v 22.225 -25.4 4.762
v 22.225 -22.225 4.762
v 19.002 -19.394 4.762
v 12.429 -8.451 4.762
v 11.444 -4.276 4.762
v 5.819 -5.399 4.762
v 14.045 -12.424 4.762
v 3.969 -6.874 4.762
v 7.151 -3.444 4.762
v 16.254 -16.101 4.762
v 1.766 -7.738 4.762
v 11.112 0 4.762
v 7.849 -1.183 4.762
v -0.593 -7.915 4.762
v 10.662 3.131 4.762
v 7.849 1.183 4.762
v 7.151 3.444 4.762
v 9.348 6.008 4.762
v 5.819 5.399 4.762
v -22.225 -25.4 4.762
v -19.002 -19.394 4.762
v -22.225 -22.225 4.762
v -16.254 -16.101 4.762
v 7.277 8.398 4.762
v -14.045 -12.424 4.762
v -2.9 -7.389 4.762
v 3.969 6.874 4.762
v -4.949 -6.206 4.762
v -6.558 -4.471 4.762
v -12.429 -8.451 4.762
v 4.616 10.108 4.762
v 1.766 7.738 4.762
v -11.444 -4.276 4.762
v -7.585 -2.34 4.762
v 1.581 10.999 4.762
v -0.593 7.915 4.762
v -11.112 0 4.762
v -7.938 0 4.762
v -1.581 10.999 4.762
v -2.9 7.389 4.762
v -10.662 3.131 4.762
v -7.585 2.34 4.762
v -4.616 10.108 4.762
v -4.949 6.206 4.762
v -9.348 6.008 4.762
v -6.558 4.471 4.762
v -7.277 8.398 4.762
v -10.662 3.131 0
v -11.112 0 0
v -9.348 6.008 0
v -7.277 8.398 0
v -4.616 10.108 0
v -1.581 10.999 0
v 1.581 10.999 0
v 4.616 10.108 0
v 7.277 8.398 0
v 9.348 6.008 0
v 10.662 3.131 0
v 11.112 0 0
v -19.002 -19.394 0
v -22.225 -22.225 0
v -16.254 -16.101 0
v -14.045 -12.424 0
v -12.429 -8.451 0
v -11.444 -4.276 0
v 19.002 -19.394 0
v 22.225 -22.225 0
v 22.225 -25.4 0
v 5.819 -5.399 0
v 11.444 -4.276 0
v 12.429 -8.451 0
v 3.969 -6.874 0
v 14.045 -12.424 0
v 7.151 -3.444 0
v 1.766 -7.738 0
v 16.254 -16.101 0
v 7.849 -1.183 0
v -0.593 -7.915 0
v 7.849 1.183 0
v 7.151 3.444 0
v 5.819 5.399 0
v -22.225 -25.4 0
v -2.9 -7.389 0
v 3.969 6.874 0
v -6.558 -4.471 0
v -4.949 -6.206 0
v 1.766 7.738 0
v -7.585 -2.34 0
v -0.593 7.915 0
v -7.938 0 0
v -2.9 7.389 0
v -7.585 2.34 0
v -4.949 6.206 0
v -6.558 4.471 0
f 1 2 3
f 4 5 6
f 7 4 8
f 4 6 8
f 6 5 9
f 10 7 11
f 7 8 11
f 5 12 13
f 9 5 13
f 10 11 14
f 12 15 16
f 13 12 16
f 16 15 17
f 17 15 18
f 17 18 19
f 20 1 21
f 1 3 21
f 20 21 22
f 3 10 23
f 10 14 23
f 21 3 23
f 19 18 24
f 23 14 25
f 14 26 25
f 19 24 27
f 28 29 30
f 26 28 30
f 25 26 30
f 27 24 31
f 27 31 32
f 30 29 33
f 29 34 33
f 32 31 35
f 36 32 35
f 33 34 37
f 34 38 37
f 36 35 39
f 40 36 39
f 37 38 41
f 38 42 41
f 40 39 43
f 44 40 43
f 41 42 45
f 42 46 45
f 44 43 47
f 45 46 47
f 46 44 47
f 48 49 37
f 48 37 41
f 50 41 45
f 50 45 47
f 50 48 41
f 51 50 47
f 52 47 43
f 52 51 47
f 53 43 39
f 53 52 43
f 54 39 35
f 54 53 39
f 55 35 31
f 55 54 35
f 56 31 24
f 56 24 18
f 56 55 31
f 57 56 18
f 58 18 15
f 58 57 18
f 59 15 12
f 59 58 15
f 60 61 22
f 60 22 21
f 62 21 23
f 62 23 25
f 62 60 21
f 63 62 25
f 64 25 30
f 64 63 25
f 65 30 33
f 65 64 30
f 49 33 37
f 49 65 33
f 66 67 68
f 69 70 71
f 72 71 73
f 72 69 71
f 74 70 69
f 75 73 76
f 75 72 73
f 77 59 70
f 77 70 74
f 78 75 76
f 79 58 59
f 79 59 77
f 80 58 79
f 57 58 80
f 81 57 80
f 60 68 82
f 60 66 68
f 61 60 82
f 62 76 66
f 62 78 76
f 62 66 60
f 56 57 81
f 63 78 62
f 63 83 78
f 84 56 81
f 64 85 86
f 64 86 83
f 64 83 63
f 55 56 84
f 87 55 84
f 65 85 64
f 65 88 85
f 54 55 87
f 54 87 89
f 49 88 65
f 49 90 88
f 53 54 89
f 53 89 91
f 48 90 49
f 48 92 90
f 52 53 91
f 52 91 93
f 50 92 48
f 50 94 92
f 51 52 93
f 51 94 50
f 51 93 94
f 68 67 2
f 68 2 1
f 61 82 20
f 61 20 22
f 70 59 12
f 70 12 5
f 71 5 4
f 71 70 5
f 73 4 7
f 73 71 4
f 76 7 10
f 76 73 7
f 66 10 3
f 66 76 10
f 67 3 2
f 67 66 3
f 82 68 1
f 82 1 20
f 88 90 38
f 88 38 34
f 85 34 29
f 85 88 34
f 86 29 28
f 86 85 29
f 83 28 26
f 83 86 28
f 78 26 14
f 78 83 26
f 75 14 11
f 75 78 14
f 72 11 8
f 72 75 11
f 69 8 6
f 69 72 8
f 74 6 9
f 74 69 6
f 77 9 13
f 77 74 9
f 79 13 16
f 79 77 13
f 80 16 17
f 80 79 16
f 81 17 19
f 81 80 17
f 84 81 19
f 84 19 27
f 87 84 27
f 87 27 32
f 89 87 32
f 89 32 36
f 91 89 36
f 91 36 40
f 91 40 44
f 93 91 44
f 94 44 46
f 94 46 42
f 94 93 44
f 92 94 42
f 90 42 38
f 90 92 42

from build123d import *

# Parameters (mm, degrees)
SKETCH1_R           = 7.9375
BOSS_EXTRUDE1_DEPTH = 4.7625


with BuildPart() as part:
    # Sketch1 → Boss-Extrude1 (new body)
    with BuildSketch(Plane.XY):
        with BuildLine():
            ThreePointArc((11.1125, 0), (14.0454446, -12.4241527), (22.225, -22.225))
            Line((22.225, -22.225), (22.225, -25.4))
            Line((22.225, -25.4), (-22.225, -25.4))
            Line((-22.225, -25.4), (-22.225, -22.225))
            ThreePointArc((-22.225, -22.225), (-14.0454446, -12.4241527), (-11.1125, 0))
            ThreePointArc((-11.1125, 0), (0, 11.1125), (11.1125, 0))
        make_face()
        with Locations(Location((0, 0, 0), (0, 0, 180))):
            Circle(SKETCH1_R, mode=Mode.SUBTRACT)
    extrude(amount=BOSS_EXTRUDE1_DEPTH)


solid = part.part
